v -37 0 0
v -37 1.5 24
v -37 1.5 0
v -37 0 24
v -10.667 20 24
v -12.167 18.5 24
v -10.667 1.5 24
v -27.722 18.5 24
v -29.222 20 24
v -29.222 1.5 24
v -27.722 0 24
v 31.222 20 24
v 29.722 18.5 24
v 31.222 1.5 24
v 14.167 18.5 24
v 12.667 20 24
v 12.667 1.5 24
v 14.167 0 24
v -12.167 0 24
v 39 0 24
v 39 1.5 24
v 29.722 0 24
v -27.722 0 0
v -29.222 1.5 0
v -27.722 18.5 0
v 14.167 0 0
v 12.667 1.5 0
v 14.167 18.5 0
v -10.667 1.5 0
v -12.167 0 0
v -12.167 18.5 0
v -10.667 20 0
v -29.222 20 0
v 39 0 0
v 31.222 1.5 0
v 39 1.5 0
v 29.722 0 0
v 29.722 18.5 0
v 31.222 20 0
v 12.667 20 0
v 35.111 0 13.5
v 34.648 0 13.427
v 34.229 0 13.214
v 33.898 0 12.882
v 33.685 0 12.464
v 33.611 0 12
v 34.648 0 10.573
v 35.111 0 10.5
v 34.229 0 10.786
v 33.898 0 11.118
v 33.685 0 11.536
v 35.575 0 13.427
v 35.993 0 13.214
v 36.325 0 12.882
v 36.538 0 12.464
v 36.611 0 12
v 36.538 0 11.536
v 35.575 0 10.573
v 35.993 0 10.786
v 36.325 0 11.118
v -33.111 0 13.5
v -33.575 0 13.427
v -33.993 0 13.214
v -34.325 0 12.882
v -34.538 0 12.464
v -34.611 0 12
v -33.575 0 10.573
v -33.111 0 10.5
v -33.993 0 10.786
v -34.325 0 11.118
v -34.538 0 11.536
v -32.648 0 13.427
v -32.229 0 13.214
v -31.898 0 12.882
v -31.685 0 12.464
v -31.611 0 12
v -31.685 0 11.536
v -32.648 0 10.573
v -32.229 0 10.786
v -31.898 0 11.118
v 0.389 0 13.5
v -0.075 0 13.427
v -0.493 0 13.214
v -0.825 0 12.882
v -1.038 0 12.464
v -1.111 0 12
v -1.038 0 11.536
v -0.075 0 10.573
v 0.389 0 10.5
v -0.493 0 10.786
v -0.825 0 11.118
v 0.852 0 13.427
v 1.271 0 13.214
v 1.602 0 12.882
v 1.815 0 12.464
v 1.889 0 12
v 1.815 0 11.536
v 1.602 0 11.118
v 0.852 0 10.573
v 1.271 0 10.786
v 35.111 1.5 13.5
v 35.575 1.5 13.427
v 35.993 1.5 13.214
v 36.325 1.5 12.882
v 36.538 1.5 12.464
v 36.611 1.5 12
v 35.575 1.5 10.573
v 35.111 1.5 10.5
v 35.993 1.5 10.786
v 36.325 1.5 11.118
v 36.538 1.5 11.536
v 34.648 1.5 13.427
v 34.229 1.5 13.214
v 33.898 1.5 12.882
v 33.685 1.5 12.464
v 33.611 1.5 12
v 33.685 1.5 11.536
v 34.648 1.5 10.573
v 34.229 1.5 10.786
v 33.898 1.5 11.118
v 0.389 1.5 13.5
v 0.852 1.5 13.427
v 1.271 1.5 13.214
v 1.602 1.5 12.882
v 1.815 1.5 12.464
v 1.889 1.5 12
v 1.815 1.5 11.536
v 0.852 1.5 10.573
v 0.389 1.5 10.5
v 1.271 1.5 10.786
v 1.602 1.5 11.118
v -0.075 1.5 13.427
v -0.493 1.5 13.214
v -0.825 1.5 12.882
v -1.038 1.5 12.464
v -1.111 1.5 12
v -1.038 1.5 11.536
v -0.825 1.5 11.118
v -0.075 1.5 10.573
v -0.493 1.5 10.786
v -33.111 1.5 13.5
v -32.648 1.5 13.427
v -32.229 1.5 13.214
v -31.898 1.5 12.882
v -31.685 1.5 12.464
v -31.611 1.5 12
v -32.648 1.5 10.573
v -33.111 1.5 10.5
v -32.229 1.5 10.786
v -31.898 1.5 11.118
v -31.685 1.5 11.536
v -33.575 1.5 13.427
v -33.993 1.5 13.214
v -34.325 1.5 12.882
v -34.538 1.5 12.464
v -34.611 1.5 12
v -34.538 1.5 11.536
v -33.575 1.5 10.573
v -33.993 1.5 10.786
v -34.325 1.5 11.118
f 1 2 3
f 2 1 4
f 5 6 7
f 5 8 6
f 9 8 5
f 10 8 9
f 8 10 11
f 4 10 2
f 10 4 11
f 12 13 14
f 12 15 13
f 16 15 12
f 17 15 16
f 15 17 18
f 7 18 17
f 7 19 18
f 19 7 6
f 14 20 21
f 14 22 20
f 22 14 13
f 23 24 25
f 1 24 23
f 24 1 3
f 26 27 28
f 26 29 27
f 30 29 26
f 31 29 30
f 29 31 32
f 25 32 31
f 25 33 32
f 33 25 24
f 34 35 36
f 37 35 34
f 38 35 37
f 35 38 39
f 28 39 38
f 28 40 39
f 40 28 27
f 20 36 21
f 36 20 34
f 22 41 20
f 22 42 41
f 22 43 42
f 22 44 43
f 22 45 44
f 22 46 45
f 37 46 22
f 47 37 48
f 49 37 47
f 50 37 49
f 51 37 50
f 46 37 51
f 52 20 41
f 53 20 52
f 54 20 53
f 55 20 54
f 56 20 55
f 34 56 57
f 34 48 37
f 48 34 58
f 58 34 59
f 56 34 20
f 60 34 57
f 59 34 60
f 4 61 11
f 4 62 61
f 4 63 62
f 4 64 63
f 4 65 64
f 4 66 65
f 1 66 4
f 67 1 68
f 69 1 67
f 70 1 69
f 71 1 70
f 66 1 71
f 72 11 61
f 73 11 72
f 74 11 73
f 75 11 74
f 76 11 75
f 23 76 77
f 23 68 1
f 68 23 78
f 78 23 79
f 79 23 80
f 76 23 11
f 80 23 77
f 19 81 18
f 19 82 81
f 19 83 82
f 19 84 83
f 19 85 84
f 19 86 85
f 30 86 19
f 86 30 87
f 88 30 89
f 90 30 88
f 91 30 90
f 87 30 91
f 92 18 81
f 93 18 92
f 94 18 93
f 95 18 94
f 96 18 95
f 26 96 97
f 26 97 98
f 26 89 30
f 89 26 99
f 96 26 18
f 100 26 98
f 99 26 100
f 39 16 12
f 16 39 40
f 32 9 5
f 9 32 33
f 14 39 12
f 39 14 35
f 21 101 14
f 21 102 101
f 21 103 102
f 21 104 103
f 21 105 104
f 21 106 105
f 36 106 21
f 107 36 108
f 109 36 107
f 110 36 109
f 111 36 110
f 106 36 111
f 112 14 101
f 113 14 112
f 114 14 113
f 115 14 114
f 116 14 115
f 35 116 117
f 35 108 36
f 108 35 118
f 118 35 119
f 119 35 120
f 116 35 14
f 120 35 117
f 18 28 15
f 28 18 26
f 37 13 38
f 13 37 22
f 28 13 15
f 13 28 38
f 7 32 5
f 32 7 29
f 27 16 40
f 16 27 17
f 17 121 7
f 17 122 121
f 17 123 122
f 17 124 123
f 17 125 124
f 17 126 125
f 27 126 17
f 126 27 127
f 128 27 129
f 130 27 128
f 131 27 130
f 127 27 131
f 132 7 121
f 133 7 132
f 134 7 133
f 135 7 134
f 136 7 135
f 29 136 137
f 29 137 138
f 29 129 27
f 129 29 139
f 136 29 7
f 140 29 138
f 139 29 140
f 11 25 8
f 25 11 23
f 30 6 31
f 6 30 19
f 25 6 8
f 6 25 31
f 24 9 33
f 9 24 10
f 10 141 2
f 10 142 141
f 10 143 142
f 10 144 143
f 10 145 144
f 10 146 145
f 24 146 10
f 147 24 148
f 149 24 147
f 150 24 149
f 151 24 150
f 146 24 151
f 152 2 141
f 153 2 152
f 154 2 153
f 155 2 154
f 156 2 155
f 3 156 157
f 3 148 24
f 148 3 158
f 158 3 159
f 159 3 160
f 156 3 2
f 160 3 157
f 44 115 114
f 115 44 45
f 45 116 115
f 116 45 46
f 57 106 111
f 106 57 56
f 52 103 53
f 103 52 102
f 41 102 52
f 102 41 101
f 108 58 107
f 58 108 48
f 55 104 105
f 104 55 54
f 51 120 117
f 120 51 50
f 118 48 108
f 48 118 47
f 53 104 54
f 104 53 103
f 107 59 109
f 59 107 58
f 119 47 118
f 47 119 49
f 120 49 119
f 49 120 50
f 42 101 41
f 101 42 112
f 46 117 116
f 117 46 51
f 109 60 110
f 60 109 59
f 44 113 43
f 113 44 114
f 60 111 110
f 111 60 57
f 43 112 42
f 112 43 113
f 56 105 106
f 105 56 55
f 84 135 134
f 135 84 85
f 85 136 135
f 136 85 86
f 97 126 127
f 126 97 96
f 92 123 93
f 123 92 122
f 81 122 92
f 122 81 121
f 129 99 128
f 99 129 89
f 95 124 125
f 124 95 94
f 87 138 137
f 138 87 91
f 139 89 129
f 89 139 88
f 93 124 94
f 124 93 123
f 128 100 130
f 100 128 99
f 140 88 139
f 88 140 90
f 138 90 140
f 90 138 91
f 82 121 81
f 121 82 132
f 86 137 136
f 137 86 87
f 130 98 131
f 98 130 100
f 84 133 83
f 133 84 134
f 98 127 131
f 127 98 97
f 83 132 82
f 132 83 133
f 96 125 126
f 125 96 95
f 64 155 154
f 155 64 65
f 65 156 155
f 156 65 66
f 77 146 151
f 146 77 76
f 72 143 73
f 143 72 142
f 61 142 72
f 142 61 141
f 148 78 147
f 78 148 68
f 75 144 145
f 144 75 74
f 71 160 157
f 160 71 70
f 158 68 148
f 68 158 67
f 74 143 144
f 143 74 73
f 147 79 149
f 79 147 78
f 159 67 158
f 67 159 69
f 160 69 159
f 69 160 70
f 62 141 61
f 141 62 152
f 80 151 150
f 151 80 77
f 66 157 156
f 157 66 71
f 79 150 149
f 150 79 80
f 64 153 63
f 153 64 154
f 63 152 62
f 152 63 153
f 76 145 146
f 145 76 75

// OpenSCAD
anchoPared  = 1.5;

diffOffset = 10;

cuboX = 70;
cuboY = 20;
cuboZ = 24;

rotate([0, 0, 180])
translate([-39, -20, 0])
difference() {

cube([cuboX + 4 * anchoPared, cuboY, cuboZ]);

translate([-diffOffset/2, -diffOffset, -diffOffset/2])
#cube([cuboX/9 + diffOffset/2, cuboY - anchoPared + diffOffset, cuboZ + diffOffset]);
    
translate([cuboX / 9 + anchoPared, anchoPared, -diffOffset/2])
#cube([2 * cuboX/9, cuboY - anchoPared + diffOffset, cuboZ + diffOffset]);
    
translate([3 * cuboX / 9 + (2 * anchoPared), -diffOffset, -diffOffset/2])
#cube([3 * cuboX/9, cuboY - anchoPared + diffOffset, cuboZ + diffOffset]);    
    
translate([6 * cuboX / 9 + (3 * anchoPared), anchoPared, -diffOffset/2])
#cube([2 * cuboX/9, cuboY - anchoPared + diffOffset, cuboZ + diffOffset]);    
    
translate([8 * cuboX / 9 + (4 * anchoPared), -diffOffset, -diffOffset/2])    
#cube([cuboX/9 + diffOffset/2, cuboY - anchoPared + diffOffset, cuboZ + diffOffset]);    
   


translate([cuboX/18, cuboY + diffOffset / 2, cuboZ/2])        
rotate([90, 0, 0])
    #cylinder(h = anchoPared + diffOffset, r = 1.5, $fn=20);
    
translate([4 * cuboX/9 + 5*anchoPared, cuboY + diffOffset / 2, cuboZ/2])        
rotate([90, 0, 0])
    #cylinder(h = anchoPared + diffOffset, r = 1.5, $fn=20);    
    
translate([cuboX - cuboX/18 + 4* anchoPared, cuboY + diffOffset / 2, cuboZ/2])        
rotate([90, 0, 0])
    #cylinder(h = anchoPared + diffOffset, r = 1.5, $fn=20);    
}
